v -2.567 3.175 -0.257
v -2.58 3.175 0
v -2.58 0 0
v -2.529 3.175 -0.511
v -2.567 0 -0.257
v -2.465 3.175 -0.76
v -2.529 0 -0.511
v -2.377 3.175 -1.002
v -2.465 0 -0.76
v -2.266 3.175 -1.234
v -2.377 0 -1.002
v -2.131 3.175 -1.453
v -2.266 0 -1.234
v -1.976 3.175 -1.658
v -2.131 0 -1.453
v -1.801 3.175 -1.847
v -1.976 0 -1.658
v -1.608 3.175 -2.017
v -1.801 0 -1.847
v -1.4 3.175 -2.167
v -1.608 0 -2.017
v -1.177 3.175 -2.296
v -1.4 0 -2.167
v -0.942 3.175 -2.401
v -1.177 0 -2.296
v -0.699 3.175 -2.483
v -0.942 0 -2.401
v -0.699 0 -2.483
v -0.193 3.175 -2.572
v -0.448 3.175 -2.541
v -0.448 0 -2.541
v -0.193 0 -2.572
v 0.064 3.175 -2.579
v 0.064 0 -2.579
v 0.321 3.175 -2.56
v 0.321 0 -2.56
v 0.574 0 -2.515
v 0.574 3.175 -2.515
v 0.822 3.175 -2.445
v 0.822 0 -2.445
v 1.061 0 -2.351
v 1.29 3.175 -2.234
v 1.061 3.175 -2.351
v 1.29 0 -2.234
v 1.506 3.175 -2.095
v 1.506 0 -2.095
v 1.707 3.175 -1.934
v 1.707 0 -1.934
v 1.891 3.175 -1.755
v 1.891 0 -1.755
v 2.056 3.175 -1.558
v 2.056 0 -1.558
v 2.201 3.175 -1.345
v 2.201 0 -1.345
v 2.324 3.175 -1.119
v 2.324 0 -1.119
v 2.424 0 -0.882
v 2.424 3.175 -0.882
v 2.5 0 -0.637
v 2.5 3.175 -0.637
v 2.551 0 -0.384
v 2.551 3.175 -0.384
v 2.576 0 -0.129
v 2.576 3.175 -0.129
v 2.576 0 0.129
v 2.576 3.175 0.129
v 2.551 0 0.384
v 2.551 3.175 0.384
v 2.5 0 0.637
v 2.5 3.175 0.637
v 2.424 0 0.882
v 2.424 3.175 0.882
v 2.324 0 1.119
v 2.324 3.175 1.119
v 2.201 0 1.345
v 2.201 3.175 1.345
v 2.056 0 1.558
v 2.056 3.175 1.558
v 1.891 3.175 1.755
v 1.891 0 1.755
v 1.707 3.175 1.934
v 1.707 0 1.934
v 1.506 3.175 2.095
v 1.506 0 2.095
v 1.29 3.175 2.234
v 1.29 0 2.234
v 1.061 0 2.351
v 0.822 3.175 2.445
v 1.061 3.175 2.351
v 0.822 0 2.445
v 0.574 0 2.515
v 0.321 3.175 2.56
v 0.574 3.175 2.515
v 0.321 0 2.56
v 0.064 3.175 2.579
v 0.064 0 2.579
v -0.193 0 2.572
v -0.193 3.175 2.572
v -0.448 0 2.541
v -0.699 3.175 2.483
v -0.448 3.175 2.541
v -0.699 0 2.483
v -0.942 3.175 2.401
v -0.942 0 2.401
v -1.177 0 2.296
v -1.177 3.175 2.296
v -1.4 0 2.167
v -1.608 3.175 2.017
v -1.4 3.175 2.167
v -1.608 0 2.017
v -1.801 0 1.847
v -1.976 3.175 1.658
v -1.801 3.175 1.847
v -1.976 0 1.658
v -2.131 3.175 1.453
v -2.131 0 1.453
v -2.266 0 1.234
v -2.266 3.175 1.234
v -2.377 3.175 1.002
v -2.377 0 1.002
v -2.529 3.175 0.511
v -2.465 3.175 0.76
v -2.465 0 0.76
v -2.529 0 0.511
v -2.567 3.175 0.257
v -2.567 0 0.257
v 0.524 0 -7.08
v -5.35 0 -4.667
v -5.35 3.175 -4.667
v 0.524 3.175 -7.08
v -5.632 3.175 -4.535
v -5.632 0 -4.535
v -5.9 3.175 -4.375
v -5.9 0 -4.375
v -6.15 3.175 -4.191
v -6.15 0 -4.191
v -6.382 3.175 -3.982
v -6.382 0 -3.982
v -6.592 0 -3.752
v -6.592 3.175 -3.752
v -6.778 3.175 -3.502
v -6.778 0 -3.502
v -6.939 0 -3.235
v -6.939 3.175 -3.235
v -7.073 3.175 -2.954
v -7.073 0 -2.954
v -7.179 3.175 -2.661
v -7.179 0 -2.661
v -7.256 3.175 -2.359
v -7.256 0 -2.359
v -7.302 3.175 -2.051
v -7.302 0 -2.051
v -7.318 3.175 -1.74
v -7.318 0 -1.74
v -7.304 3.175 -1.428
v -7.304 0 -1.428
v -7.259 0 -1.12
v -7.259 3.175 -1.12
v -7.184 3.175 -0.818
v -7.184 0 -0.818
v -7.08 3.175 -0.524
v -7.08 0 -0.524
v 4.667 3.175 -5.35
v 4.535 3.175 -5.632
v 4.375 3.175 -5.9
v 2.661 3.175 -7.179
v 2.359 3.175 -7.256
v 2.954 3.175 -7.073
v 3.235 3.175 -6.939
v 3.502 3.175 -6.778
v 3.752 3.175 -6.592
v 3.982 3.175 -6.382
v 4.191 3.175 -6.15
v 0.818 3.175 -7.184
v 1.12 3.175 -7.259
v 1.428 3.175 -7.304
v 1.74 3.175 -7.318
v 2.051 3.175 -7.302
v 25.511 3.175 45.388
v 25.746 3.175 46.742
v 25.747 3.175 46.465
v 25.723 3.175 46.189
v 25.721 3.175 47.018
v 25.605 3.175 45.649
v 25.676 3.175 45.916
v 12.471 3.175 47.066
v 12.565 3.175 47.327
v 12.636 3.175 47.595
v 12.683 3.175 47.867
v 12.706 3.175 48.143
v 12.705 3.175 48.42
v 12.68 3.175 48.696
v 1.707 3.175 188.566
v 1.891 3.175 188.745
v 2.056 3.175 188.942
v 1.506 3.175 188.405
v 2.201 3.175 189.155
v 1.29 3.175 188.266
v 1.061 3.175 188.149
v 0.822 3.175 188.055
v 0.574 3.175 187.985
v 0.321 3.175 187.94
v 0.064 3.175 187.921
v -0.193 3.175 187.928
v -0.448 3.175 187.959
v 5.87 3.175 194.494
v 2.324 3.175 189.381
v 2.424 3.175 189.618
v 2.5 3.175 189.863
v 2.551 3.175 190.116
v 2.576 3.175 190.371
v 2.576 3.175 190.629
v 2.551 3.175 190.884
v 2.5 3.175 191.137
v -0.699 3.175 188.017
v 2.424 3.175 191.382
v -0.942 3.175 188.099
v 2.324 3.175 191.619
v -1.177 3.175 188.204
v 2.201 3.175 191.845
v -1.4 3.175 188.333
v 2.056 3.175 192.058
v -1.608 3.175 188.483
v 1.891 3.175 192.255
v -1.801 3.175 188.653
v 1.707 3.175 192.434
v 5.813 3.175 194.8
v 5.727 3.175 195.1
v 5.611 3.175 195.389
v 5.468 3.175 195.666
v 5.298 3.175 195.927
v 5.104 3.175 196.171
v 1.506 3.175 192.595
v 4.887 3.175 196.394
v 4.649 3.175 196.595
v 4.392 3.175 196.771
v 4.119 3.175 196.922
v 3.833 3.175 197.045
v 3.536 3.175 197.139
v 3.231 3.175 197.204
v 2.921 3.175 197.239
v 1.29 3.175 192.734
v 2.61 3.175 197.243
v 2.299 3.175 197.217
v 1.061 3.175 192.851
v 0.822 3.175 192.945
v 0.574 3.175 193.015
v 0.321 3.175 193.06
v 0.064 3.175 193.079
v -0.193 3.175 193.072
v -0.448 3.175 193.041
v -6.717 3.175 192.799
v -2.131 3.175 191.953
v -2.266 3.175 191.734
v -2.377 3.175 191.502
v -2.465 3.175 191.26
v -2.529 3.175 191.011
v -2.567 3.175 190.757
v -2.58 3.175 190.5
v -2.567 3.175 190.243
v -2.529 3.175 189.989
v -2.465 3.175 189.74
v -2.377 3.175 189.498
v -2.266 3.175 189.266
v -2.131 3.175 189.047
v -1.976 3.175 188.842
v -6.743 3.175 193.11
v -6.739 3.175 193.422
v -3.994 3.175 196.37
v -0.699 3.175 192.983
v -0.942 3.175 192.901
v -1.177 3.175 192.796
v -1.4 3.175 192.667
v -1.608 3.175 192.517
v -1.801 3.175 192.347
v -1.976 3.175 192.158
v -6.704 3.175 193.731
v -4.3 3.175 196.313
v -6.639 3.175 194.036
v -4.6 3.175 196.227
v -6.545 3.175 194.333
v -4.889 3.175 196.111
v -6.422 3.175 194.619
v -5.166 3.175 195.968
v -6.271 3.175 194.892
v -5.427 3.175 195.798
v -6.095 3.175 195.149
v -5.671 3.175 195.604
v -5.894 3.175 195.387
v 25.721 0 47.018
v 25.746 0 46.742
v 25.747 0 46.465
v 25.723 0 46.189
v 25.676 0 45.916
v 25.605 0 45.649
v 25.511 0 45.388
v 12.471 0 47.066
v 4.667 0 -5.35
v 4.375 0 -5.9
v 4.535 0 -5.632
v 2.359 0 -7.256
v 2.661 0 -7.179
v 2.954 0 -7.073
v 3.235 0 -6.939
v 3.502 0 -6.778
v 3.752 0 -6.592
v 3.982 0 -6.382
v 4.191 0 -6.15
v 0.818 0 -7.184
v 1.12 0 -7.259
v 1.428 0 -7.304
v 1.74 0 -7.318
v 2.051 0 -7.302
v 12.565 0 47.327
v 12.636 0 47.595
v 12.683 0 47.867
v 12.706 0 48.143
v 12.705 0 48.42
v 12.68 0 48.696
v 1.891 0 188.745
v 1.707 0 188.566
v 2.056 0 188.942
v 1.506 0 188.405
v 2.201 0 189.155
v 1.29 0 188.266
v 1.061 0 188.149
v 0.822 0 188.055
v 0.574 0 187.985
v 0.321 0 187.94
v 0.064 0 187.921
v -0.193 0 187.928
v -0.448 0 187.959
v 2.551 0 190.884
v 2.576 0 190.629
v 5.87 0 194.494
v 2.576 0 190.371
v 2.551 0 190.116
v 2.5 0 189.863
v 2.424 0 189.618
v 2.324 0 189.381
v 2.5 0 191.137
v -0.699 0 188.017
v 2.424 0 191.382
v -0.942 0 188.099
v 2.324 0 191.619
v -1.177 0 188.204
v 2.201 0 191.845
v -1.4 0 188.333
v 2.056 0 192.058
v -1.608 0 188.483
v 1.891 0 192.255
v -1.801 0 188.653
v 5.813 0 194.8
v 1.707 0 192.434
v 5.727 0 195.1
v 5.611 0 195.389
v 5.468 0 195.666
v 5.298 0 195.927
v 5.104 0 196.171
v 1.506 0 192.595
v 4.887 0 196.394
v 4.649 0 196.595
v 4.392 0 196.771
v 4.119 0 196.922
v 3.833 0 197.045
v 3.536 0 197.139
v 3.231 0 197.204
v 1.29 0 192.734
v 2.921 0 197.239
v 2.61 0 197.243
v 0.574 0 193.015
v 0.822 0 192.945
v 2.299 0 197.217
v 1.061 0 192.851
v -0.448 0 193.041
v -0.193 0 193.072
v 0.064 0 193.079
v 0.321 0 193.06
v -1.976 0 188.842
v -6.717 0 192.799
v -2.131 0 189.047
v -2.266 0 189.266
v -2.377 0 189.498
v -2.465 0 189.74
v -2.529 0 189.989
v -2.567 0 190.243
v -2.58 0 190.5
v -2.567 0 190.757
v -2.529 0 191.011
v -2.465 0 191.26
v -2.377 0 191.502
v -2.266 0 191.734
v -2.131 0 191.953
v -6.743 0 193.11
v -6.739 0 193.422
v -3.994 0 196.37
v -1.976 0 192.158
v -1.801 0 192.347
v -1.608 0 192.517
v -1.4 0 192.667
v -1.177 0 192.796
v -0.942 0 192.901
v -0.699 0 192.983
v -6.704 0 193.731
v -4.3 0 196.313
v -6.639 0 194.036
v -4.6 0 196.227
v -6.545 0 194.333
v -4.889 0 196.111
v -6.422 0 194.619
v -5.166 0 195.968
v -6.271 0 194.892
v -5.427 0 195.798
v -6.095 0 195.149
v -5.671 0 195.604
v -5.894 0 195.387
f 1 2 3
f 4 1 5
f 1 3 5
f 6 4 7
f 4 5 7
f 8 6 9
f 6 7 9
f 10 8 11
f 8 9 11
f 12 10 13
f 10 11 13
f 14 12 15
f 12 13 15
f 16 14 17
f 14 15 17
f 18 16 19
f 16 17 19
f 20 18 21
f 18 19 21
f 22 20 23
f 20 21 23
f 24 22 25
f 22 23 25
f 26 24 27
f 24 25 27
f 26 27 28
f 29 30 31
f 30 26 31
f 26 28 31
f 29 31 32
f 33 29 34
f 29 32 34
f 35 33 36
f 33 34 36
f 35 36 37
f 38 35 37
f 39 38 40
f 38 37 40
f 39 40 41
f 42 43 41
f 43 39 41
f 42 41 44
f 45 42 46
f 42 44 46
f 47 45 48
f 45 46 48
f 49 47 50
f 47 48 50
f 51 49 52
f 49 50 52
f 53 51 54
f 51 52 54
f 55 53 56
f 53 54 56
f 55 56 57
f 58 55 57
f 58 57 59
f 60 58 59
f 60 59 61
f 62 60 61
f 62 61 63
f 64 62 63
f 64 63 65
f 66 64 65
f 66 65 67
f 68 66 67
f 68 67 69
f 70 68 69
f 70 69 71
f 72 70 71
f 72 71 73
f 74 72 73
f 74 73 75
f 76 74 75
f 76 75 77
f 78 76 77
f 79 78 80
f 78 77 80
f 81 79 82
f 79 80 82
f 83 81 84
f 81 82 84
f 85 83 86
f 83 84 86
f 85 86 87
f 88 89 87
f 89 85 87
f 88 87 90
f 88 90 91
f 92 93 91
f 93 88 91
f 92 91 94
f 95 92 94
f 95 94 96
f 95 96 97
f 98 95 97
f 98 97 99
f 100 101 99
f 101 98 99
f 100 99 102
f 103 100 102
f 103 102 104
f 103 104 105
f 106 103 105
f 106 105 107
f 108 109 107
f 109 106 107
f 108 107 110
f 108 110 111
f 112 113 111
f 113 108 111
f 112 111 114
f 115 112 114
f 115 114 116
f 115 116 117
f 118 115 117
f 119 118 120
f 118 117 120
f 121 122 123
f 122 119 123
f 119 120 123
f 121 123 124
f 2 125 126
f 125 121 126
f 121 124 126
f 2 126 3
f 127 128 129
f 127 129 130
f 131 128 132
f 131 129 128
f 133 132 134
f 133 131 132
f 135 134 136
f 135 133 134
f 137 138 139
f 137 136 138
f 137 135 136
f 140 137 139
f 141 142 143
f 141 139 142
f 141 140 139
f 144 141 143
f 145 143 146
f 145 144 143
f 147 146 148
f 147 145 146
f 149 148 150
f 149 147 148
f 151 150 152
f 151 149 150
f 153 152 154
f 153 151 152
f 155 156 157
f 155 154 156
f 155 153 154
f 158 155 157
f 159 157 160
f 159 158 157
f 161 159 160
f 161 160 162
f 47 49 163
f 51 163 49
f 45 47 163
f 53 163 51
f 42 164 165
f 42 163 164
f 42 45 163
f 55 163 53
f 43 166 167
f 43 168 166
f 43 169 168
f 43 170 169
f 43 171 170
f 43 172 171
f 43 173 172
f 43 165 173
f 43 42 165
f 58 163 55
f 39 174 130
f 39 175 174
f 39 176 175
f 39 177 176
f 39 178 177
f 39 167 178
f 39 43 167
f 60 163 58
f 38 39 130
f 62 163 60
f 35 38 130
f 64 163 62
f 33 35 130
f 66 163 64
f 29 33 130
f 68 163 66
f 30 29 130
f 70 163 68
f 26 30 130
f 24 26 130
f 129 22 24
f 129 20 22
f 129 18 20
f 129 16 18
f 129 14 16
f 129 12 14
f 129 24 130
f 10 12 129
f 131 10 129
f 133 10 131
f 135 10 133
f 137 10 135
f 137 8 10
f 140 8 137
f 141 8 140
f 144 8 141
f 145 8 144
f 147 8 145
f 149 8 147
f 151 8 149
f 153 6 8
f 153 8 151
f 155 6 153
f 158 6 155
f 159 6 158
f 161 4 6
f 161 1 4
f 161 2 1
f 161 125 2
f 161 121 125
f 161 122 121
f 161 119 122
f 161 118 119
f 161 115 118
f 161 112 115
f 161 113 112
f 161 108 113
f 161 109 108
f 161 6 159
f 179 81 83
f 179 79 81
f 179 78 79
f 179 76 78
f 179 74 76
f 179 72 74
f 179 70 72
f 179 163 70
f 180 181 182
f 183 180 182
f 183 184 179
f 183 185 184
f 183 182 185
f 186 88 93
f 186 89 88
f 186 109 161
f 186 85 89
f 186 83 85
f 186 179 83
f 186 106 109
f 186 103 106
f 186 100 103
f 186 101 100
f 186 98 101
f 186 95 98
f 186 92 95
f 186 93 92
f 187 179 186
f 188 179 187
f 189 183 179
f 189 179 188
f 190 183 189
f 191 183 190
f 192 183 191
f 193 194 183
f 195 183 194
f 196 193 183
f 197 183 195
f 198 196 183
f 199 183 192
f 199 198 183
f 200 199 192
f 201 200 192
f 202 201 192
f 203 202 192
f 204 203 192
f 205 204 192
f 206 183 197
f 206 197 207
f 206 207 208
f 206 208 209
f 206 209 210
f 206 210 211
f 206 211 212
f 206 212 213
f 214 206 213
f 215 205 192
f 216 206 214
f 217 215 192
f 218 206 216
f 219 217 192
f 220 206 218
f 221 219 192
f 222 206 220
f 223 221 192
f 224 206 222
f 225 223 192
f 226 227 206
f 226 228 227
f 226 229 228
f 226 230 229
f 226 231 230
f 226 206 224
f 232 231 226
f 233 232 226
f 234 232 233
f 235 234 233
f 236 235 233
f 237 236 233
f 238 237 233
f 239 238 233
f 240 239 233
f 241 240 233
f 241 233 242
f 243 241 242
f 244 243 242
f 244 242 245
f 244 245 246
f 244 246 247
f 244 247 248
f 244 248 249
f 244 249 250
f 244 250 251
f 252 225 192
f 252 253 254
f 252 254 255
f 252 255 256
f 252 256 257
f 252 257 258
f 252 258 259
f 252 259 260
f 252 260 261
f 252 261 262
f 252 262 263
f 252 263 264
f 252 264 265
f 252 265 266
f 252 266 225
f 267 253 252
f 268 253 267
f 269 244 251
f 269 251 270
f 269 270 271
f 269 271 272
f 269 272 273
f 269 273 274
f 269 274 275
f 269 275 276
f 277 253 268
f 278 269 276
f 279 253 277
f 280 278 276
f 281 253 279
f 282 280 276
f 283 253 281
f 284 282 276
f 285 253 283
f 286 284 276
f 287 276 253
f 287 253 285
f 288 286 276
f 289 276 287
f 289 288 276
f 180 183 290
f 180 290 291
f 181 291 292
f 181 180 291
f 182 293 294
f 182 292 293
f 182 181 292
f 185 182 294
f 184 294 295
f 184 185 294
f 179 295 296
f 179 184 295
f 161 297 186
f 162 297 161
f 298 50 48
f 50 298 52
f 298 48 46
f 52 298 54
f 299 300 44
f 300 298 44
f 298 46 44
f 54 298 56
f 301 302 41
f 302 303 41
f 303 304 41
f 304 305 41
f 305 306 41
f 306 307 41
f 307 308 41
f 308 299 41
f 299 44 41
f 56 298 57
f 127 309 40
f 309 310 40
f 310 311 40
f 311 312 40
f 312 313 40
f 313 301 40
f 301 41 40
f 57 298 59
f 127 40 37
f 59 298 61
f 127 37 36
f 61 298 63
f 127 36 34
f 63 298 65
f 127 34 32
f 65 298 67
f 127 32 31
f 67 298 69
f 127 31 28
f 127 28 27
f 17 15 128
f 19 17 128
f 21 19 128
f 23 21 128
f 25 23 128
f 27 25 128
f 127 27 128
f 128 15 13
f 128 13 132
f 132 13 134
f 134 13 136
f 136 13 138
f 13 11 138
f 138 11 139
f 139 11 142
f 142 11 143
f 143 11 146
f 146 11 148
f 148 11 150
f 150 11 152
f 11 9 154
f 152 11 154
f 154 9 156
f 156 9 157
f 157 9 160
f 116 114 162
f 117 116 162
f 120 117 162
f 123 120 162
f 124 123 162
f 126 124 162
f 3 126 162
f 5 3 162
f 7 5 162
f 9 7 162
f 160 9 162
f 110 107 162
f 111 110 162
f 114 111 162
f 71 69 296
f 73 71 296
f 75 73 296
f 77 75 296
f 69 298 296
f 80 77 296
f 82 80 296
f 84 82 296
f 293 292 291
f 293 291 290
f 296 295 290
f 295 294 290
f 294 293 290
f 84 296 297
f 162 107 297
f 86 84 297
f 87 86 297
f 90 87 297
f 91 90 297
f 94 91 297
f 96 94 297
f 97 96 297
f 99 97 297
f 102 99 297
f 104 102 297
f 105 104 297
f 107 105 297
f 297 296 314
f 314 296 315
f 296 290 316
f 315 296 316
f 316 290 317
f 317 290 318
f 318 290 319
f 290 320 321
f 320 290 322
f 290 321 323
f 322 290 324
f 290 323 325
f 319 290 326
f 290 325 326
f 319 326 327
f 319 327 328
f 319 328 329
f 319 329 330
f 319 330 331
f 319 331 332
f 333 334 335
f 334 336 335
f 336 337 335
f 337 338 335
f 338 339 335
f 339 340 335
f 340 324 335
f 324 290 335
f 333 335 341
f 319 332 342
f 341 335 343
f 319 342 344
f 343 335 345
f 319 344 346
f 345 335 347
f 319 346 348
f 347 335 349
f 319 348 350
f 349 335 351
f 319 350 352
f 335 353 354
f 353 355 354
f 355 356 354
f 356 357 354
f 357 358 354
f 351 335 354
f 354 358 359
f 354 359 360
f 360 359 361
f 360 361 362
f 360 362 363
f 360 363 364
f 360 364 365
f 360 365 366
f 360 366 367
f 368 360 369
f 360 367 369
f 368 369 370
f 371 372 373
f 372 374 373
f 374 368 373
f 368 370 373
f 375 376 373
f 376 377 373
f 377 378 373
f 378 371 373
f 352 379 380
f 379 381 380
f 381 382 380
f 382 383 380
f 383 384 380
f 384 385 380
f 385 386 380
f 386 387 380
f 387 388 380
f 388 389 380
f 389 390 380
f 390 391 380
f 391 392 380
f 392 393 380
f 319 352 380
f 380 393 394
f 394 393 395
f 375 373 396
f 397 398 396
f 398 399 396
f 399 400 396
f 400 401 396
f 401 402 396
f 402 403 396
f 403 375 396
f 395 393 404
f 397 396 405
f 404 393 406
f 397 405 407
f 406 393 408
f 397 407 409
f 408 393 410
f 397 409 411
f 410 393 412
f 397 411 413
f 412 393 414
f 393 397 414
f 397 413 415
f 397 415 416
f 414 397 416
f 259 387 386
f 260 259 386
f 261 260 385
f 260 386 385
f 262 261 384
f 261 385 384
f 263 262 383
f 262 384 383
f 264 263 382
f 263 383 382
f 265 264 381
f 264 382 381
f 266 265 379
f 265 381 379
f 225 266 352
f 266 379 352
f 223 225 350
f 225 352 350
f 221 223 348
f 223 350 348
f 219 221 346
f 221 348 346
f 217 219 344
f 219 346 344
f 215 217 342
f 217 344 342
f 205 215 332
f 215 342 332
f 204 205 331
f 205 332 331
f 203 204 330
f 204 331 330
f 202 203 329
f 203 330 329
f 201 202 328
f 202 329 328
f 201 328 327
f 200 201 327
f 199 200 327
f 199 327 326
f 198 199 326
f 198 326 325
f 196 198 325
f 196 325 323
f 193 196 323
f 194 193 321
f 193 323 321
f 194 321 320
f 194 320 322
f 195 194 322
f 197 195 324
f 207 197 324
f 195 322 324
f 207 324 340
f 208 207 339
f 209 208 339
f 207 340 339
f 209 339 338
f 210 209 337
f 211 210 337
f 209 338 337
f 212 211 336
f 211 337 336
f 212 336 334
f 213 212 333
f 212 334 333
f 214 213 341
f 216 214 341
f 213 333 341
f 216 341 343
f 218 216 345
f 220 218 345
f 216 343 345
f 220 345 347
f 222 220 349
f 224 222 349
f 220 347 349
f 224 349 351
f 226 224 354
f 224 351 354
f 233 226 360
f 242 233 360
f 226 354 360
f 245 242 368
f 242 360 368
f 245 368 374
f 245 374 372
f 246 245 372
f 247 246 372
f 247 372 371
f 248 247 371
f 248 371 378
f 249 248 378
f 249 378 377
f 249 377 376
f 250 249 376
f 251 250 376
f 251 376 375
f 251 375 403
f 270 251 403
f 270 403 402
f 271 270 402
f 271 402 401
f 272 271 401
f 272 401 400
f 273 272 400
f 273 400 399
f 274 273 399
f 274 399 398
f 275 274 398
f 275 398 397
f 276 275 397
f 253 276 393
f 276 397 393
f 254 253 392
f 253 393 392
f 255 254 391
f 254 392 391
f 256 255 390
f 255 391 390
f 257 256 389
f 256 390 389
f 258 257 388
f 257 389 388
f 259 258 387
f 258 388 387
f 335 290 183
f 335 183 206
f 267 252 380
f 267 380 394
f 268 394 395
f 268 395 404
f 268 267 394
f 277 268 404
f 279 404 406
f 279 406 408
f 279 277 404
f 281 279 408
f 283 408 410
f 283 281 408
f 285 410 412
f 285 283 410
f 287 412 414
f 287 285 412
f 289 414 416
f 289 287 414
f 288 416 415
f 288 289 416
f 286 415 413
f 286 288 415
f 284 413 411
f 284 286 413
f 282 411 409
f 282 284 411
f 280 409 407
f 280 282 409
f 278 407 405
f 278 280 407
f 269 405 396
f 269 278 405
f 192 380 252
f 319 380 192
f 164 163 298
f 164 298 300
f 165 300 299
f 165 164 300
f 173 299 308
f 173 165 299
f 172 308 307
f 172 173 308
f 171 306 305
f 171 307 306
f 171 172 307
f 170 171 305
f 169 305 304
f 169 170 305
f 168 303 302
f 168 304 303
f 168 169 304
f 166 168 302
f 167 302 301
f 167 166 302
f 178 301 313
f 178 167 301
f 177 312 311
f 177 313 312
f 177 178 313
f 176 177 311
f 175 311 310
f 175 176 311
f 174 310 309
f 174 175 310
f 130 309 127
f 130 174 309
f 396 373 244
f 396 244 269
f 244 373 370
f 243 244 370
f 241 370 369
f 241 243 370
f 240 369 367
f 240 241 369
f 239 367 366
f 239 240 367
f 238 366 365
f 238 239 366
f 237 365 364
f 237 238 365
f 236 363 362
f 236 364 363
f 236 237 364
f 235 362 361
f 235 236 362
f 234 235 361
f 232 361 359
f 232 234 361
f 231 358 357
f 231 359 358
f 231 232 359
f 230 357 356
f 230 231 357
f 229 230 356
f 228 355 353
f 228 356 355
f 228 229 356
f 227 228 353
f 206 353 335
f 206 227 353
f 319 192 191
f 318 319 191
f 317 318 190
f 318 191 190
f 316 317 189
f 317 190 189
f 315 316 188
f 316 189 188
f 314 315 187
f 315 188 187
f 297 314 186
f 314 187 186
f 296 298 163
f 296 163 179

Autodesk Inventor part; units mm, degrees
ref_plane "YZ Plane" through (0, 0, 0) normal (1, 0, 0) x (0, 1, 0)
ref_plane "XZ Plane" through (0, 0, 0) normal (0, 1, 0) x (-1, 0, 0)
ref_plane "XY Plane" through (0, 0, 0) normal (0, 0, 1) x (1, 0, 0)
sketch "Sketch1" plane through (0, 0, 0) normal (0, 1, 0) x (-1, 0, 0)
  line L0 (0, 0) -> (0, 190.5)
  line L1 (0, 190.5) -> (-19.3142, 47.0141)
  line L2 (-19.3142, 47.0141) -> (0, 0)
  line L3 (8.2867, -3.4607) -> (-3.4607, -8.2867)
  line L4 (-3.4607, -8.2867) -> (-25.8344, 46.1749)
  line L5 (-25.8344, 46.1749) -> (-14.0871, 51.0009)
  line L6 (-14.0871, 51.0009) -> (8.2867, -3.4607)
  line L7 (-5.4461, 197.6404) -> (7.1404, 195.9461)
  line L8 (7.1404, 195.9461) -> (-13.2479, 44.4807)
  line L9 (-13.2479, 44.4807) -> (-25.8344, 46.1749)
  line L10 (-25.8344, 46.1749) -> (-5.4461, 197.6404)
  circle A0 centre (0, 0) radius 2.5797
  circle A1 centre (-19.3142, 47.0141) radius 2.5797
  circle A2 centre (0, 190.5) radius 2.5797
  point P0 (0.8471, 196.7932)
  point P1 (2.413, -5.8737)
  point P2 (-12.7939, 47.8532)
  dimension "d0" = 150
  dimension "d1" = 190.5
  dimension "d2" = 144.78
  dimension "d3" = 12.7
  dimension "d4" = 5.1594
  dimension "d5" = 6.35
  dimension "d6" = 6.35
extrude "Extrusion1" add sketch "Sketch1" along normal blind 3.175 contours A0 L2 A1 L9 L8 L6 L0 | L0 L6 L3 L4 L9 A1 L2 A0 | A1 L9 L2 | L2 L9 A1 | L8 L6 L5 A1 L1 A2 L0 | L0 A2 L1 A1 L5 L10 L7 L8 | L8 L9 A1 L5 L6 | L9 A1 L5 L1 L2 | L2 L1 L5 A1 L9 | L9 L5 A1 | A1 L1 L5 | L5 L1 A1
fillet "Fillet1" radius 3.175 6 edges at (-7.1404, 1.5875, 195.9461) (5.4461, 1.5875, 197.6404) (25.8344, 1.5875, 46.1749) (12.7939, 1.5875, 47.8532) (3.4607, 1.5875, -8.2867) (-8.2867, 1.5875, -3.4607)
properties part number "PB IN"
